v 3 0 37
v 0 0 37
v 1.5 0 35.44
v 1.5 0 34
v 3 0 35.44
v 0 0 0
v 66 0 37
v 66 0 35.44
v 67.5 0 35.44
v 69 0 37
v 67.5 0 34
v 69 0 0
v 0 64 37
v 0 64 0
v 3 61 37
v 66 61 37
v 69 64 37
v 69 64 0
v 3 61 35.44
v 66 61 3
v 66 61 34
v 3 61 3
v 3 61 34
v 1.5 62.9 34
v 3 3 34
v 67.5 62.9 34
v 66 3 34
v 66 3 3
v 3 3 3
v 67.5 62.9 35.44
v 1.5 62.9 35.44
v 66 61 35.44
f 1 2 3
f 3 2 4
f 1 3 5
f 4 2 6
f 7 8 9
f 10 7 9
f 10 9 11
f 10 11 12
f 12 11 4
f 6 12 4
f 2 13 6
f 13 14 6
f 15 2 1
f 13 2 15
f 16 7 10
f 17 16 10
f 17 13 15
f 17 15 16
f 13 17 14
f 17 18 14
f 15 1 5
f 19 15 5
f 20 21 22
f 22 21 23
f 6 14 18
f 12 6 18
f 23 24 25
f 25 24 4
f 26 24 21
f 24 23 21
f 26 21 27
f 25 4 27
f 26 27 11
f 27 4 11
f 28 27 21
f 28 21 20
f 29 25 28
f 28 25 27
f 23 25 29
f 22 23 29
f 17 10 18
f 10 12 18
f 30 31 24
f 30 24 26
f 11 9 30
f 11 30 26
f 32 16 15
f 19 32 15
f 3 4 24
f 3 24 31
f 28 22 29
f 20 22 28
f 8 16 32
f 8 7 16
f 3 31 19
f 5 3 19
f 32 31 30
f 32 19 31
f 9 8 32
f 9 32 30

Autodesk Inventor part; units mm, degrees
ref_plane "YZ Plane" through (0, 0, 0) normal (1, 0, 0) x (0, 1, 0)
ref_plane "XZ Plane" through (0, 0, 0) normal (0, 1, 0) x (-1, 0, 0)
ref_plane "XY Plane" through (0, 0, 0) normal (0, 0, 1) x (1, 0, 0)
sketch "Sketch1" plane through (0, 0, 0) normal (0, 0, 1) x (1, 0, 0)
  line L0 (0, 0) -> (69, 0)
  line L1 (69, 0) -> (69, 64)
  line L2 (69, 64) -> (0, 64)
  line L3 (0, 64) -> (0, 0)
  dimension "d0" = 69
  dimension "d1" = 64
extrude "Extrusion1" add sketch "Sketch1" along normal blind 37
sketch "Sketch2" plane through (0, 0, 37) normal (0, 0, 1) x (1, 0, 0)
  line L0 (69, 64) -> (0, 64) projected
  line L1 (69, 0) -> (69, 64) projected
  line L2 (0, 64) -> (69, 64)
  line L3 (69, 64) -> (69, 0)
  line L4 (69, 0) -> (0, 0)
  line L5 (0, 0) -> (0, 64)
  line L6 (3, 3) -> (66, 3)
  line L7 (66, 3) -> (66, 61)
  line L8 (66, 61) -> (3, 61)
  line L9 (3, 61) -> (3, 3)
  dimension "d4" = 3
extrude "Extrusion2" cut sketch "Sketch2" against normal blind 34 contours L9 L8 L7 L6
sketch "Sketch3" plane through (0, 0, 0) normal (0, -1, 0) x (1, 0, 0)
  line L0 (3, 37) -> (3, 3) projected
  line L1 (66, 37) -> (66, 3) projected
  line L2 (3, 37) -> (66, 37)
  line L3 (66, 37) -> (66, 34)
  line L4 (66, 34) -> (3, 34)
  line L5 (3, 34) -> (3, 37)
  point P0 (0, 0)
  point P1 (3, 34)
  dimension "d7" = 3
extrude "Extrusion3" cut sketch "Sketch3" against normal up to surface (3 mm away)
sketch "Sketch4" plane through (0, 0, 0) normal (0, -1, 0) x (1, 0, 0)
  line L0 (3, 34) -> (66, 34) projected
  line L1 (34.5, 34) -> (67.5, 34)
  line L2 (67.5, 34) -> (1.5, 34)
  line L3 (1.5, 34) -> (1.5, 35.44)
  line L4 (1.5, 35.44) -> (67.5, 35.44)
  line L5 (67.5, 35.44) -> (67.5, 34)
  point P0 (0, 0)
  dimension "d10" = 33
  dimension "d11" = 66
  dimension "d12" = 1.44
extrude "Extrusion4" cut sketch "Sketch4" against normal blind 62.9
properties part number "TOP"
